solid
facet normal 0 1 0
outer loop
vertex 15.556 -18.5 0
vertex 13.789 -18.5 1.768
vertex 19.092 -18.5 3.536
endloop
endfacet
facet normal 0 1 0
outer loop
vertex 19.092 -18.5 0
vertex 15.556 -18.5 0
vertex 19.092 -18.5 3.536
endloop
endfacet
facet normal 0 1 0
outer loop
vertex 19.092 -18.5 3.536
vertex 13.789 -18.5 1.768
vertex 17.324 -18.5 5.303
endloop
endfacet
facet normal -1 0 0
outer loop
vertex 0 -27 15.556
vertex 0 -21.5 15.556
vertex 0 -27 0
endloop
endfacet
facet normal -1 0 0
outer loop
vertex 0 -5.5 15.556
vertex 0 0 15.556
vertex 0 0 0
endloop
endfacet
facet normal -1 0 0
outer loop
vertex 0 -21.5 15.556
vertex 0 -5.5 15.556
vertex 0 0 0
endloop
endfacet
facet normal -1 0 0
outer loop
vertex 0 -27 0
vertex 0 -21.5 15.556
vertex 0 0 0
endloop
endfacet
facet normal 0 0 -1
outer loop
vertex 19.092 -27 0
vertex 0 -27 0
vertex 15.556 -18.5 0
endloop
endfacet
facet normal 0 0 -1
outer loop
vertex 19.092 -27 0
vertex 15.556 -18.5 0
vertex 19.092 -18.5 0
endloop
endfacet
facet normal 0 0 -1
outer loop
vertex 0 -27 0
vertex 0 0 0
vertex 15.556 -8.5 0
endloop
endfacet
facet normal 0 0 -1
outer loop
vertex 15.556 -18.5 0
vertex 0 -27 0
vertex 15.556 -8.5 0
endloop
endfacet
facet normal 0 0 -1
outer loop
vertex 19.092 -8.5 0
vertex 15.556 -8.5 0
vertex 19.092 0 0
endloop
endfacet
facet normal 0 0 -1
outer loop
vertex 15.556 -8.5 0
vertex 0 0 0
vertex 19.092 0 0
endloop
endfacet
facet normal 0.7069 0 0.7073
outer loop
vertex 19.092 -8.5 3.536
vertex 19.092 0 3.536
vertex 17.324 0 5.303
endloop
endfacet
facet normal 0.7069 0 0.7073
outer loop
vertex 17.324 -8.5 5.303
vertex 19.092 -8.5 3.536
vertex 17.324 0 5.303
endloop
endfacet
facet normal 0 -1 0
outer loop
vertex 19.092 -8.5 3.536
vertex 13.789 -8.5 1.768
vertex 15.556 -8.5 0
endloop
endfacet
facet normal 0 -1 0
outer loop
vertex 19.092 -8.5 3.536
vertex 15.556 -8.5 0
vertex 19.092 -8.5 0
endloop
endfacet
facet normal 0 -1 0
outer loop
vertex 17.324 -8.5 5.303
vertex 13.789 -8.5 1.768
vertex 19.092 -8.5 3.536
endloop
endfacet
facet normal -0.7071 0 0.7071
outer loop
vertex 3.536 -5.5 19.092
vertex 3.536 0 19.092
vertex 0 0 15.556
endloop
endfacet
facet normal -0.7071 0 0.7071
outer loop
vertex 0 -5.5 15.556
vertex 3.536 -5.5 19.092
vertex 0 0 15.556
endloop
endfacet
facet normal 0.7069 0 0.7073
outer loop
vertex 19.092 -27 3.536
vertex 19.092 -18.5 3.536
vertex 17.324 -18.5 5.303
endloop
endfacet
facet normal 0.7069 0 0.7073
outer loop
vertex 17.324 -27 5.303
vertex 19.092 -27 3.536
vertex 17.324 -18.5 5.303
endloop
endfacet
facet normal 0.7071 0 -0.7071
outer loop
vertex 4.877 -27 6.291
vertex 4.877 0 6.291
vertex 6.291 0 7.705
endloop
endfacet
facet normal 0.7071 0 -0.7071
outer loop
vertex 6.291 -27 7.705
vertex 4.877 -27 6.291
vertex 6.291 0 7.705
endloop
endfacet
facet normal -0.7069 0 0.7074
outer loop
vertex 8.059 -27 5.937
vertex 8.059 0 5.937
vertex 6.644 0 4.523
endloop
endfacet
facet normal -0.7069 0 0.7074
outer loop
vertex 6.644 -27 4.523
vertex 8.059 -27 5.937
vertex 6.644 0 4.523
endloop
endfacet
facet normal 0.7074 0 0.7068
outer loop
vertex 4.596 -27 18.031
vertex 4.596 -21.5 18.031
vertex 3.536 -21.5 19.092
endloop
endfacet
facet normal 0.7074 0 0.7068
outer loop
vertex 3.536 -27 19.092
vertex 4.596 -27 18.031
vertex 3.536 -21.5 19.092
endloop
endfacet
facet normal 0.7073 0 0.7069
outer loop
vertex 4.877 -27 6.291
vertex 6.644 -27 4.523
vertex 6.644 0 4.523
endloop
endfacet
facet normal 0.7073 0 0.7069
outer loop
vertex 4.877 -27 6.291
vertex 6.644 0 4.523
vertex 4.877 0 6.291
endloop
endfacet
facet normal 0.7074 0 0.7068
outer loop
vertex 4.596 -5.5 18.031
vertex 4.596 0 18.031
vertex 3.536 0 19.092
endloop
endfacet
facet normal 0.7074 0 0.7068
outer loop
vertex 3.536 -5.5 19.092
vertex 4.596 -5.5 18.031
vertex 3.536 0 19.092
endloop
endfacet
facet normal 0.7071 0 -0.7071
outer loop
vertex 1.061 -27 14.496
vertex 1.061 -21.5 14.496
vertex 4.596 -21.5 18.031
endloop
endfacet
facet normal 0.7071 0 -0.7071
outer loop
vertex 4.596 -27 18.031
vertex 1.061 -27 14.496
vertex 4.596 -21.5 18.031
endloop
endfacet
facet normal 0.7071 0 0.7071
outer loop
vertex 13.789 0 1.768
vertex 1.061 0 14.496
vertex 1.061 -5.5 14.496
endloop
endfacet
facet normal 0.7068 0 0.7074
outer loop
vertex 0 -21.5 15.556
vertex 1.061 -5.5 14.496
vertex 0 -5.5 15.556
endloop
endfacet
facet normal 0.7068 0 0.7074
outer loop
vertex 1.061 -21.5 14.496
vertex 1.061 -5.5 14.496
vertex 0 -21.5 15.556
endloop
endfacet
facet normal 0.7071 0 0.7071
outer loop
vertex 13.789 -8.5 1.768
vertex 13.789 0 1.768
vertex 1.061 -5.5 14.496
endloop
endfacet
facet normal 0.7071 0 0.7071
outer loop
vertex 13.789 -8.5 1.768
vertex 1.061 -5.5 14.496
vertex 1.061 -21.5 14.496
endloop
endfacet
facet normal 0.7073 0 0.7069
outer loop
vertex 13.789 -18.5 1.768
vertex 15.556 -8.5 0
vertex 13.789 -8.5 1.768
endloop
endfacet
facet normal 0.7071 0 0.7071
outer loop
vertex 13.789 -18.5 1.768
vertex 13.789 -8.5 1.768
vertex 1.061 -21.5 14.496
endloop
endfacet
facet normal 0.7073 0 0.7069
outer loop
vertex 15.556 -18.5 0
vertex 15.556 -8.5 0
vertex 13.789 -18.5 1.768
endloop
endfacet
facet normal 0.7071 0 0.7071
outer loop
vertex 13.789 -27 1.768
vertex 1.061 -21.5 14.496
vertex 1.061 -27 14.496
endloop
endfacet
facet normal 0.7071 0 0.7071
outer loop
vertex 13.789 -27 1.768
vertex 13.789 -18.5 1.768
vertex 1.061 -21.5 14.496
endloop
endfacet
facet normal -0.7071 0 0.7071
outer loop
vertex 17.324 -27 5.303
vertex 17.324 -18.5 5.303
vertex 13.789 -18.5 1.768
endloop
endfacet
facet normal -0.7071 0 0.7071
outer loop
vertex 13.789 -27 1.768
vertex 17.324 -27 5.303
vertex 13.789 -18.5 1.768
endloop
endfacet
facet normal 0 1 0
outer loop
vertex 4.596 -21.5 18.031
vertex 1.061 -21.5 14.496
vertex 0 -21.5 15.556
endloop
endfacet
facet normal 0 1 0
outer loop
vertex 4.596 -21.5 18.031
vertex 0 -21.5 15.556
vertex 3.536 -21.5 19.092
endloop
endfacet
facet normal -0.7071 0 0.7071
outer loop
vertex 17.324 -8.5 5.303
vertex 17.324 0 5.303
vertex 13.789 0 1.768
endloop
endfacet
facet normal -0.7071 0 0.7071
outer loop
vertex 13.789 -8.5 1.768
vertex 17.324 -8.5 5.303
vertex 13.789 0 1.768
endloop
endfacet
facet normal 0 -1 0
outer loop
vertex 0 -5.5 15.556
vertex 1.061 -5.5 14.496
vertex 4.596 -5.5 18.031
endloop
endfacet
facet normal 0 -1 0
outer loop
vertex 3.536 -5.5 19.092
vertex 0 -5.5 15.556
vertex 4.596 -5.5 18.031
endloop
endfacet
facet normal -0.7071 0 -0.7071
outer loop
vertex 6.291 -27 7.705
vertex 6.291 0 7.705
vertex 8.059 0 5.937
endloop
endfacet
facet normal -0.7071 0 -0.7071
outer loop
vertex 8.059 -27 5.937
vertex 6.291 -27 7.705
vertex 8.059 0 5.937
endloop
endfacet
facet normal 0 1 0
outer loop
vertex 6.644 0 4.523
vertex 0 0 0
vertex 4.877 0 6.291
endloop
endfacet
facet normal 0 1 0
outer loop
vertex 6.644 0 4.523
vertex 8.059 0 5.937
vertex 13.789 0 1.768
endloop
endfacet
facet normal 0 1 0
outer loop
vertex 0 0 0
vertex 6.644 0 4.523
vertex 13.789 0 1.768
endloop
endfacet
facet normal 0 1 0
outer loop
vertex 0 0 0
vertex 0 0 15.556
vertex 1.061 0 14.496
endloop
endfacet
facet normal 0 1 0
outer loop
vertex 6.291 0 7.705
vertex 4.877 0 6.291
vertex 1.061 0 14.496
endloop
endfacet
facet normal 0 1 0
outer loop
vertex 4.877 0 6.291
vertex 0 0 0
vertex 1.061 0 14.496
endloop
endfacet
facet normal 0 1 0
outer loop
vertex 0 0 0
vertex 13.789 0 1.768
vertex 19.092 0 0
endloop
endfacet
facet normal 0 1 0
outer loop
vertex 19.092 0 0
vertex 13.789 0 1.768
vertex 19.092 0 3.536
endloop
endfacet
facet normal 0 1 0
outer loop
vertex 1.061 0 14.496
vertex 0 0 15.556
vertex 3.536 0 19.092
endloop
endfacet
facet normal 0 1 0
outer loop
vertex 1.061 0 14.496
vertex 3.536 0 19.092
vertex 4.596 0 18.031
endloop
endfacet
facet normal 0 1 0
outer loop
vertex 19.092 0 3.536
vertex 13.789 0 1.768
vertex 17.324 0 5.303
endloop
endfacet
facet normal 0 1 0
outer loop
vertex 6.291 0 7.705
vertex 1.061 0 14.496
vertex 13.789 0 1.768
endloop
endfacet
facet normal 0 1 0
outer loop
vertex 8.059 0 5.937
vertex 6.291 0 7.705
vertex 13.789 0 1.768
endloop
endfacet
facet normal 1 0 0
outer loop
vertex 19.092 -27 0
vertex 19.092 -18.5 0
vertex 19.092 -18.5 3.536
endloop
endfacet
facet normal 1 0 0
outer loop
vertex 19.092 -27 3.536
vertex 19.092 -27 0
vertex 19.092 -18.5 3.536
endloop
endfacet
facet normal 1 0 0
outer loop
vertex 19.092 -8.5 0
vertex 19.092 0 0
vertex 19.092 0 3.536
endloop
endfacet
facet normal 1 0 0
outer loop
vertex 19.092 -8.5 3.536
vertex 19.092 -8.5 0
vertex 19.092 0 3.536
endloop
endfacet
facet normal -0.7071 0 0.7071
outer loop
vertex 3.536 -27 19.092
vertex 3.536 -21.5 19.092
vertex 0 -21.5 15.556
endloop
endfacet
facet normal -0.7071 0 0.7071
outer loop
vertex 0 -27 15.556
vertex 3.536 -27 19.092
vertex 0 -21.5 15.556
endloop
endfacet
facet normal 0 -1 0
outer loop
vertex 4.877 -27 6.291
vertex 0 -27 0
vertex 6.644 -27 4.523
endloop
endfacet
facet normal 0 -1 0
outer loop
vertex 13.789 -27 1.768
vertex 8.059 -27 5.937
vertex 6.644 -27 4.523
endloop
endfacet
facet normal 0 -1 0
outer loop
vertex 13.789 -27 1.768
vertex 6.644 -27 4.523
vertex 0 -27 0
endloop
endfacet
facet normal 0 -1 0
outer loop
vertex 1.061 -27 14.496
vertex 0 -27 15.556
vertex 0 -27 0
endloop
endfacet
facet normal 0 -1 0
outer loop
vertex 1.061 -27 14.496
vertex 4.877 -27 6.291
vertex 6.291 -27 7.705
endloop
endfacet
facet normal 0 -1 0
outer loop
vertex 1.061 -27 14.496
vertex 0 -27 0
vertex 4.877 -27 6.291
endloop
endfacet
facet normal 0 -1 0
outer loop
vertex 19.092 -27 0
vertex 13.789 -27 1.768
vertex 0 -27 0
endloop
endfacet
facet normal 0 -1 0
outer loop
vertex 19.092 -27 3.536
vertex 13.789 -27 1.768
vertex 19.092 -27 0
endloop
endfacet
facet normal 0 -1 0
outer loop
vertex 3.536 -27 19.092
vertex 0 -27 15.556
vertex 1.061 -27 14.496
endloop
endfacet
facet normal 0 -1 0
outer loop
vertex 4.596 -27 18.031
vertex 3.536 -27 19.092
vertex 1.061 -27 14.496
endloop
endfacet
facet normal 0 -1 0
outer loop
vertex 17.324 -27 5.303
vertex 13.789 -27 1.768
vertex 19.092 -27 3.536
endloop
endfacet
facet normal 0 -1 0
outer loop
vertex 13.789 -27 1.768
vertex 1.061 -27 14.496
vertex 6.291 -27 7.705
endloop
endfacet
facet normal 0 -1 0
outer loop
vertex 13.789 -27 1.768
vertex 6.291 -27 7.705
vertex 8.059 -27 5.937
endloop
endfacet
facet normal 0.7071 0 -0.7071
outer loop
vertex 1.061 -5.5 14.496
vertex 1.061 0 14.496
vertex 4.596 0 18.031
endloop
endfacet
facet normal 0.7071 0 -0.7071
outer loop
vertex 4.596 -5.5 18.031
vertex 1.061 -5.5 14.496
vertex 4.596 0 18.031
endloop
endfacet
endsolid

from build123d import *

# Parameters (mm, degrees)
F1_DEPTH = 27
F2_W     = 5
F2_H     = 16
F3_DEPTH = 25
F4_W     = 10
F4_H     = 5
F5_DEPTH = 25


with BuildPart() as f1:
    # F0 (on Front) → F1 (new body)
    with BuildSketch(Plane.XZ):
        Polygon((0, 15.5563491861), (0, 0), (15.5563491861, 0), (13.7885822331, 1.767766953), (1.0606601718, 14.4956890143), align=None)
        Polygon((4.8765578995, 6.2907714619), (6.2907714619, 7.7049850243), (8.0585384149, 5.9372180713), (6.6443248525, 4.5230045089), align=None, mode=Mode.SUBTRACT)
        Polygon((3.5355339059, 19.091883092), (0, 15.5563491861), (1.0606601718, 14.4956890143), (4.5961940777, 18.0312229203), align=None)
        Polygon((13.7885822331, 1.767766953), (15.5563491861, 0), (19.091883092, 3.5355339059), (17.3241161391, 5.3033008589), align=None)
        Polygon((19.091883092, 3.5355339059), (15.5563491861, 0), (19.091883092, 0), align=None)
    extrude(amount=F1_DEPTH)

    # F2 (on face) → F3 (cut)
    with BuildSketch(Plane(origin=(-6.7175144213, 0, 6.7175144213), x_dir=(0.7071067812, 0, 0.7071067812), z_dir=(0.7071067812, 0, -0.7071067812))):
        with Locations((13.5, 13.5)):
            Rectangle(F2_W, F2_H)
    extrude(amount=-F3_DEPTH, mode=Mode.SUBTRACT)

    # F4 (on face) → F5 (cut)
    with BuildSketch(Plane(origin=(6.0104076401, 0, -6.0104076401), x_dir=(0, -1, 0), z_dir=(-0.7071067812, 0, 0.7071067812))):
        with Locations((13.5, 13.5)):
            Rectangle(F4_W, F4_H)
    extrude(amount=-F5_DEPTH, mode=Mode.SUBTRACT)


solid = f1.part
